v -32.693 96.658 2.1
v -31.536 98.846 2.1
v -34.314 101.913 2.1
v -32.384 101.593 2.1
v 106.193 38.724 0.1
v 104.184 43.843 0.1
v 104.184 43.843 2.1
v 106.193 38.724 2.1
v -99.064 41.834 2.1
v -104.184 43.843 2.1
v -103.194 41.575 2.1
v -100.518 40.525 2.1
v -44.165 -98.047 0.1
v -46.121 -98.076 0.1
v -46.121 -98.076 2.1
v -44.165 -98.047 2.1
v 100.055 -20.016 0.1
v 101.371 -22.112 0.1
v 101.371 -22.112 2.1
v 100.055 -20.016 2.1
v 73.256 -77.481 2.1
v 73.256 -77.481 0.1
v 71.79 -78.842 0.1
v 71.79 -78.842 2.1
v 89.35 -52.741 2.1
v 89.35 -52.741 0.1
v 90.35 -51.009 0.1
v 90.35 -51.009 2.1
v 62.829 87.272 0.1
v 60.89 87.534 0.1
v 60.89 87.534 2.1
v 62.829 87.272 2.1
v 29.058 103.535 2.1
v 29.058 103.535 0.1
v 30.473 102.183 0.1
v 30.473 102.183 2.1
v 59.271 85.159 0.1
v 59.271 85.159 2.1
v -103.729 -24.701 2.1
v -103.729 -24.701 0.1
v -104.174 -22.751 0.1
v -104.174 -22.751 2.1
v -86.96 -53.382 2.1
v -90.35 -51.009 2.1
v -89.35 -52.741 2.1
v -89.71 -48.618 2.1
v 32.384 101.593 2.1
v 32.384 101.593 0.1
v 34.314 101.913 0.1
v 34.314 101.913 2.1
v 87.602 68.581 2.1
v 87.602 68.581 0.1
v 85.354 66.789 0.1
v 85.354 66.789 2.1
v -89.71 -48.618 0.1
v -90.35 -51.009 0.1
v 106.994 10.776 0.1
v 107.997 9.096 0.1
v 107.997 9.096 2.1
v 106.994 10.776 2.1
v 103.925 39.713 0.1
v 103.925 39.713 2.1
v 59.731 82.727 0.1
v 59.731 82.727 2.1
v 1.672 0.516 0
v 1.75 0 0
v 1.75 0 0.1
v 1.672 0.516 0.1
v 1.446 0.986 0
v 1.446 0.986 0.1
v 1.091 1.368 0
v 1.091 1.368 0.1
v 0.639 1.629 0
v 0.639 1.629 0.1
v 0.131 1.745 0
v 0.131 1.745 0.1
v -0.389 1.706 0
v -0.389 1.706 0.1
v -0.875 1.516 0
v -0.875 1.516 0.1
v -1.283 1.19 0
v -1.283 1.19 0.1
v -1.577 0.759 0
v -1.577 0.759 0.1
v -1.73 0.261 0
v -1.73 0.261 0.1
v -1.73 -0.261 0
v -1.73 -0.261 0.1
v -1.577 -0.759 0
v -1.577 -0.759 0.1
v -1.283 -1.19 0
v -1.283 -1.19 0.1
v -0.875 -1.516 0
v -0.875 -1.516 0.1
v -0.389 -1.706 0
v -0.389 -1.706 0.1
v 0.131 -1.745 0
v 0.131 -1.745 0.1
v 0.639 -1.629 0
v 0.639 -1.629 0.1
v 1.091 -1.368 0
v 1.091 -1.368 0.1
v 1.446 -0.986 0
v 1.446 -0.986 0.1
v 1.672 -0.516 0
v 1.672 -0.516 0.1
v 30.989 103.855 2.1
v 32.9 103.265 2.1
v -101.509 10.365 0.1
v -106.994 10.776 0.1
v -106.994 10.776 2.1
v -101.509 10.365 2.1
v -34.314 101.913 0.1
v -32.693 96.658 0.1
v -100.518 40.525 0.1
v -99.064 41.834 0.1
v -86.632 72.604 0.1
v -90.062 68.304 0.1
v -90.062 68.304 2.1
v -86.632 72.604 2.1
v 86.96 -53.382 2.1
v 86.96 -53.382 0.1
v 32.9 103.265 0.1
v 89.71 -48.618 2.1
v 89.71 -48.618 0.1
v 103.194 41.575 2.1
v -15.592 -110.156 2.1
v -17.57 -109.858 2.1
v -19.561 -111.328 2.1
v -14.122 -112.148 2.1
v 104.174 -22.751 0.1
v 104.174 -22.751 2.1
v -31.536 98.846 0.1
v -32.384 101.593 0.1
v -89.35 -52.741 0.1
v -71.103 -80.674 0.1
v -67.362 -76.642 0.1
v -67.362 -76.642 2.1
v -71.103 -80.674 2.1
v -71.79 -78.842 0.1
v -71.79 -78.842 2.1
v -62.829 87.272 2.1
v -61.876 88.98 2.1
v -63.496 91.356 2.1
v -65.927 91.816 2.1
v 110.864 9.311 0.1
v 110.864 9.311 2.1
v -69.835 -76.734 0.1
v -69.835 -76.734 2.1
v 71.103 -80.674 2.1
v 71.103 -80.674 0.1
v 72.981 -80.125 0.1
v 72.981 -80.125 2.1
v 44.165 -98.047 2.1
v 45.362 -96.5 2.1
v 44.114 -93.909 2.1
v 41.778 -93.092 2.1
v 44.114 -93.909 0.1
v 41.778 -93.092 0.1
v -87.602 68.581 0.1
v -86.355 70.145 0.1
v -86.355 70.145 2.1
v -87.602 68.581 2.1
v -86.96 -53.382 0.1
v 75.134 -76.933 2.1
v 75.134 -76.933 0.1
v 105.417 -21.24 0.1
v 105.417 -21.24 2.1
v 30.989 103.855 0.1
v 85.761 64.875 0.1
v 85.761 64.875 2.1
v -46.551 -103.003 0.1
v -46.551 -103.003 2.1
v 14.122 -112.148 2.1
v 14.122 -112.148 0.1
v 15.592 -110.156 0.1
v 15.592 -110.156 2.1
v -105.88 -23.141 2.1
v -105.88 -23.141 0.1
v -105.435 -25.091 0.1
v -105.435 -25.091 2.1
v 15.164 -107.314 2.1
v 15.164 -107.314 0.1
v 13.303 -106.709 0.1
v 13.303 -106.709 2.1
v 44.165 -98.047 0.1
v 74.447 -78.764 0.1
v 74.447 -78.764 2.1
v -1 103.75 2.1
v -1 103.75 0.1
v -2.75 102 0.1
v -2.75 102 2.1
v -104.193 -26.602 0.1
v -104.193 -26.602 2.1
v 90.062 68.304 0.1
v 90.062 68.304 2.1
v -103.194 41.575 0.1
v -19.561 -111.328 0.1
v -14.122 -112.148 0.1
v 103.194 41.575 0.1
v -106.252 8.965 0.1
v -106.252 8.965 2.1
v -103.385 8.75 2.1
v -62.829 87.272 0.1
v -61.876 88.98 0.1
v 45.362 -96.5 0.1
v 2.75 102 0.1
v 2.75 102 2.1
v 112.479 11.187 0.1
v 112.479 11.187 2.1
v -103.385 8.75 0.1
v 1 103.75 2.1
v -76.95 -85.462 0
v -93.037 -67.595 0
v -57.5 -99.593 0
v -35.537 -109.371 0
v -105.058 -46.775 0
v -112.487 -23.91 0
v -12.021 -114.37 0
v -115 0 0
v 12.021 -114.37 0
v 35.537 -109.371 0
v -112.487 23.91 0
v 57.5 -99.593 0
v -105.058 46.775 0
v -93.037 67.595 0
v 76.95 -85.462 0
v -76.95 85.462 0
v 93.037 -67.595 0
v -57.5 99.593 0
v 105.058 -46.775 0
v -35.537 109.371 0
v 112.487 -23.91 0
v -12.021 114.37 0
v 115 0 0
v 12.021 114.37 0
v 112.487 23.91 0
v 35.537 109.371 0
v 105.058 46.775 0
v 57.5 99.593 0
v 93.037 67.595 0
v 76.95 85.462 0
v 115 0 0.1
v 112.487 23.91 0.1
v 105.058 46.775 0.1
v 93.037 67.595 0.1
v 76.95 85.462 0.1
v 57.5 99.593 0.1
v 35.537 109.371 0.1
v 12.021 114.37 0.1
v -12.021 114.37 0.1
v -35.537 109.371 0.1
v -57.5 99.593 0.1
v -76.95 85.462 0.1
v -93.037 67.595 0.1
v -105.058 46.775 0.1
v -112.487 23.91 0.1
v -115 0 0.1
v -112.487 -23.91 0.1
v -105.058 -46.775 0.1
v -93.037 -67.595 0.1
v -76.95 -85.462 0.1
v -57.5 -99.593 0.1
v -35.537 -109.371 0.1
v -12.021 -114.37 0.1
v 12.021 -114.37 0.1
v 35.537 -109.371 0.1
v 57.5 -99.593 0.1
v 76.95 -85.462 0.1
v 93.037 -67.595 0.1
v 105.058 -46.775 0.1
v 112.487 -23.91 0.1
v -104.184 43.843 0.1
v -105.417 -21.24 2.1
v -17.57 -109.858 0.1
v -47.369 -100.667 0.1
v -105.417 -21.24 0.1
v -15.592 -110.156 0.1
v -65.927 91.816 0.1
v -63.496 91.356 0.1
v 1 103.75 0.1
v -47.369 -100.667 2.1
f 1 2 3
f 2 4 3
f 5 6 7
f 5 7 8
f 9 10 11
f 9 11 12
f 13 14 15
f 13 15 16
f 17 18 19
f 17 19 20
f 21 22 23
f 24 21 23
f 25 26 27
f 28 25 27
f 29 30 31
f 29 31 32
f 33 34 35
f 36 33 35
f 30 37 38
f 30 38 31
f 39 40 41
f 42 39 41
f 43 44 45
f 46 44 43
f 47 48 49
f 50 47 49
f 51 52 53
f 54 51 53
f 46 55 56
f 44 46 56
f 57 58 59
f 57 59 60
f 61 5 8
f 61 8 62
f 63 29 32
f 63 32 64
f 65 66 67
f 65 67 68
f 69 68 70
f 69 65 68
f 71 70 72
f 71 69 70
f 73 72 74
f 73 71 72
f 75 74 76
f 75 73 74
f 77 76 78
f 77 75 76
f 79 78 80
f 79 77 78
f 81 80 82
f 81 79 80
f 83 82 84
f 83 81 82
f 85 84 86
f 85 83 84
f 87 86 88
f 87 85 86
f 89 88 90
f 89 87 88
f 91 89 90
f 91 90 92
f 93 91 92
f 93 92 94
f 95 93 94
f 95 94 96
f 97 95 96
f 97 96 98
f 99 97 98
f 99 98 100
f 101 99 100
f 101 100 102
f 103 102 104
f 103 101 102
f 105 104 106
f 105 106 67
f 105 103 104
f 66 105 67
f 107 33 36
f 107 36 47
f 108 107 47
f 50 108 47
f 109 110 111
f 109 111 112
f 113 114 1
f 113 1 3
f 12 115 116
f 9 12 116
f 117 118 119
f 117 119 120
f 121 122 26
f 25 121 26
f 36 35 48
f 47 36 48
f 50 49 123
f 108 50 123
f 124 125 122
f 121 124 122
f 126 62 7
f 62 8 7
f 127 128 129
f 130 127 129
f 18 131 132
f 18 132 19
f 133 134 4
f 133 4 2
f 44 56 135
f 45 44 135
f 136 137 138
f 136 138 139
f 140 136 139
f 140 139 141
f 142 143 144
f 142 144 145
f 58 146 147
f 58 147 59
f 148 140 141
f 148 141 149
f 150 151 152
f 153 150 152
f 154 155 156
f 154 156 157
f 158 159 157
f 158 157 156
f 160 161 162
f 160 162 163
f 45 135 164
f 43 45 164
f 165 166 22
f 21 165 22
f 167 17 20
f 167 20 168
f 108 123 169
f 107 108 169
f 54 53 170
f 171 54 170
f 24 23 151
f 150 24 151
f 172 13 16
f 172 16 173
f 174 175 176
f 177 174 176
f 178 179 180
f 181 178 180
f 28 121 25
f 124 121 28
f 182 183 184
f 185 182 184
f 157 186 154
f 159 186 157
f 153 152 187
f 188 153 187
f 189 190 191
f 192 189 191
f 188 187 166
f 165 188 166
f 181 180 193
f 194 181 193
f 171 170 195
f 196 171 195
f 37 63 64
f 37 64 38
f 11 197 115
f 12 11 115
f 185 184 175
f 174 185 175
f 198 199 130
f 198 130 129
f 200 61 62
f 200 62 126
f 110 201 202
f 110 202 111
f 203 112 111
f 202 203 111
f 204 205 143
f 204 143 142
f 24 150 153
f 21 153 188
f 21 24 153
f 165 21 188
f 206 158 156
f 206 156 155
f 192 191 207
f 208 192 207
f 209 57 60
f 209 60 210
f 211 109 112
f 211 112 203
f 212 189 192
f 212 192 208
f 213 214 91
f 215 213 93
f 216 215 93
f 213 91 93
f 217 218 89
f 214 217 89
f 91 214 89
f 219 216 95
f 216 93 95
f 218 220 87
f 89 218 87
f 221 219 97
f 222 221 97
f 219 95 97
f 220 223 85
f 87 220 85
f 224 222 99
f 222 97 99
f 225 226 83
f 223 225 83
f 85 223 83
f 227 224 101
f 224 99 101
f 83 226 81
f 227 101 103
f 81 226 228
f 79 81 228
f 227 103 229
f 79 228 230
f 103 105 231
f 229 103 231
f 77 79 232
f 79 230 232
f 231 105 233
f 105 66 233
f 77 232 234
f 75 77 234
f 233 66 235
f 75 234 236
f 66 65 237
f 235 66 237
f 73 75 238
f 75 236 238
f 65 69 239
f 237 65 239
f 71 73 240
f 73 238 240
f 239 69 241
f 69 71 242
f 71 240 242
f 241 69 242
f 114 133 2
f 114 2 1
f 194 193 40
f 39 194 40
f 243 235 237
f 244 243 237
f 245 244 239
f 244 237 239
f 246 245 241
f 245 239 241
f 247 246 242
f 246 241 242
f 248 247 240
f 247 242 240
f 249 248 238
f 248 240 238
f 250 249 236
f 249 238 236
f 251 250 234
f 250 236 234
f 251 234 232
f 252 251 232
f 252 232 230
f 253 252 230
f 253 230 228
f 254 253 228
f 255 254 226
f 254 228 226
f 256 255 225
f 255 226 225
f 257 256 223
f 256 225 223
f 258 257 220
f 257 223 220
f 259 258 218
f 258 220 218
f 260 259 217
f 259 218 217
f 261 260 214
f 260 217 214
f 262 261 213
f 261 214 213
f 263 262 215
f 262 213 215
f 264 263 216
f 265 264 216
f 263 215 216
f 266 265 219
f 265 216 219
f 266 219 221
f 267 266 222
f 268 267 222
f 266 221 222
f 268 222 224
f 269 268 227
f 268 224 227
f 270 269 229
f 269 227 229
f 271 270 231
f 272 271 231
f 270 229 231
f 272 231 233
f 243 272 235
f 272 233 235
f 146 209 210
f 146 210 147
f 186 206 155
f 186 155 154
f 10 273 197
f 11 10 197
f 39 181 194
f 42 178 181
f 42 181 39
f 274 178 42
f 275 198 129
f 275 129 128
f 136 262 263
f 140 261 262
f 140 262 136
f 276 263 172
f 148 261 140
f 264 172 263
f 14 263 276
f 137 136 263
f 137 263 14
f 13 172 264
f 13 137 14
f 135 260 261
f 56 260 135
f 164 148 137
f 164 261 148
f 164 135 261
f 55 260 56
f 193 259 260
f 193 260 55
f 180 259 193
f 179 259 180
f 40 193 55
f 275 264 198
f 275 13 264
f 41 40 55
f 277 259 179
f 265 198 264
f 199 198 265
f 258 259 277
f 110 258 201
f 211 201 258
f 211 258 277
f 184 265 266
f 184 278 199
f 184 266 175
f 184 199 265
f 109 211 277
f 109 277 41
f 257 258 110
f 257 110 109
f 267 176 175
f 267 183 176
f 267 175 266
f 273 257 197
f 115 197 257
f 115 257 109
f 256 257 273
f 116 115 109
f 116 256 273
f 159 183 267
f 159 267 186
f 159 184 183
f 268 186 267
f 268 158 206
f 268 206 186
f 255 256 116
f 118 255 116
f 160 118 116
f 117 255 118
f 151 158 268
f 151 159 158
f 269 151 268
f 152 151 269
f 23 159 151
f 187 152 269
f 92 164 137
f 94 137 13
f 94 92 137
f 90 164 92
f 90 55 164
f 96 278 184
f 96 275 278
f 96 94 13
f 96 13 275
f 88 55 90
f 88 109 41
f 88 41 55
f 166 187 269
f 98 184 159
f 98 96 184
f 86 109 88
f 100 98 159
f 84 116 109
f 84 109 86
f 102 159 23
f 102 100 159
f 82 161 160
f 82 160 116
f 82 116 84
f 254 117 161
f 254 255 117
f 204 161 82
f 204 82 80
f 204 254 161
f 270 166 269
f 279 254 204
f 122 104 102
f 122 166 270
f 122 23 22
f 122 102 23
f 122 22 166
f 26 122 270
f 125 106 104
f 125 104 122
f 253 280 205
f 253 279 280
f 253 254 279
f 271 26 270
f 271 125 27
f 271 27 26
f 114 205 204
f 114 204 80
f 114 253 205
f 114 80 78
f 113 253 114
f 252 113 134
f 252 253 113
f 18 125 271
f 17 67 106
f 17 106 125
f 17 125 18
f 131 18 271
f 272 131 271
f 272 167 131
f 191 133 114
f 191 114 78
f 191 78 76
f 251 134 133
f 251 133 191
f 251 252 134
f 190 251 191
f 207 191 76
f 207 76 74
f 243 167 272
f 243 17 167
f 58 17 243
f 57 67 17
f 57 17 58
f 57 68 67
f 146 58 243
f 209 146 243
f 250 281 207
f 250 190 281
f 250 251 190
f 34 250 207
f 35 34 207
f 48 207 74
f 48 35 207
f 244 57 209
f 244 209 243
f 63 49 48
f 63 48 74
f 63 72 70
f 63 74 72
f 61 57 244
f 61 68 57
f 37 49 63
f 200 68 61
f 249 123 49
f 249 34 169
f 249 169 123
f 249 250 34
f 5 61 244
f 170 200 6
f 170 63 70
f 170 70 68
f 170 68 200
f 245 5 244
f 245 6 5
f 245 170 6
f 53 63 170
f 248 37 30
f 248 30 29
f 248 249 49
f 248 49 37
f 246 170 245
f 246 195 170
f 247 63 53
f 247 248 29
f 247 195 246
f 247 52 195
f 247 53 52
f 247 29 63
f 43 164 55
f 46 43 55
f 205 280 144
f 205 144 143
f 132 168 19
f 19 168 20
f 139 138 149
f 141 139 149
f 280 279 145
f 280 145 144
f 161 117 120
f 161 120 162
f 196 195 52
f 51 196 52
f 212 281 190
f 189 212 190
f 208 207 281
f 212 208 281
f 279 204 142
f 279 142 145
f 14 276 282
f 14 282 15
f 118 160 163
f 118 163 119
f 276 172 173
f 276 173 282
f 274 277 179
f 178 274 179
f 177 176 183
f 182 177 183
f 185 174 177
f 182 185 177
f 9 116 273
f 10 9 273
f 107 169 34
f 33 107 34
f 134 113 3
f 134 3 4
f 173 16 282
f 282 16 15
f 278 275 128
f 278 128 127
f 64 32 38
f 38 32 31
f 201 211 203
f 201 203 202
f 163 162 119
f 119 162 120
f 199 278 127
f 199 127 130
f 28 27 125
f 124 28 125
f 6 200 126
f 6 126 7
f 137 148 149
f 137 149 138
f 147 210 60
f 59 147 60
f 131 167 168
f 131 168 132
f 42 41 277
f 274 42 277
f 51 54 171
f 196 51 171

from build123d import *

# Parameters (mm, degrees)
SKETCH1_R           = 115
SKETCH1_R_2         = 1.75
BOSS_EXTRUDE1_DEPTH = 0.1
BOSS_EXTRUDE2_DEPTH = 2


with BuildPart() as part:
    # Sketch1 → Boss-Extrude1 (new body)
    with BuildSketch(Plane.XY):
        Circle(SKETCH1_R)
        Circle(SKETCH1_R_2, mode=Mode.SUBTRACT)
    extrude(amount=BOSS_EXTRUDE1_DEPTH)

    # Sketch2 → Boss-Extrude2 (add)
    with BuildSketch(Plane.XY.offset(0.1)):
        Polygon((2.75, 102), (1, 103.75), (-1, 103.75), (-2.75, 102), align=None)
        Polygon((-31.536422151, 98.845923426), (-32.692853006, 96.657849461), (-34.314006465, 101.913499892), (-32.383843277, 101.593195243), align=None)
        Polygon((-61.876050067, 88.980307108), (-62.829062871, 87.271538079), (-65.927323191, 91.815851338), (-63.495595234, 91.355743585), align=None)
        Polygon((-86.355262623, 70.145071939), (-87.602242226, 68.581408974), (-90.061554474, 68.304311033), (-86.632360564, 72.604384187), align=None)
        Polygon((-104.18404578, 43.843438562), (-103.194363512, 41.575062709), (-100.518101485, 40.524707264), (-99.064240162, 41.834062928), align=None)
        Polygon((-106.252124781, 8.965300026), (-106.99390044, 10.775795503), (-101.509279555, 10.364779988), (-103.385163864, 8.750451007), align=None)
        Polygon((-105.416683128, -21.239948642), (-105.880333417, -23.140778305), (-105.435291549, -25.09063413), (-104.192817991, -26.602052159), (-103.729167702, -24.701222495), (-104.17420957, -22.751366671), align=None)
        Polygon((-86.959591186, -53.38156986), (-89.709591186, -48.61843014), (-90.350135643, -51.008974596), (-89.350135643, -52.741025404), align=None)
        Polygon((-69.834869672, -76.73430444), (-67.361726605, -76.641765956), (-71.102676663, -80.673551251), (-71.790366293, -78.841828572), align=None)
        Polygon((-46.121181359, -98.076384798), (-44.164837568, -98.047333582), (-46.551198134, -103.002662356), (-47.368597109, -100.666670293), align=None)
        Polygon((-17.569782938, -109.858387151), (-15.592121286, -110.156471684), (-14.122491306, -112.147749595), (-19.56106085, -111.328017131), align=None)
        Polygon((14.122491306, -112.147749595), (15.592121286, -110.156471684), (15.163624771, -107.313583058), (13.302758842, -106.709180051), align=None)
        Polygon((45.361884816, -96.499689279), (44.164837568, -98.047333582), (41.778477003, -93.092004809), (44.114469066, -93.909403784), align=None)
        Polygon((71.102676663, -80.673551251), (72.980668584, -80.124669347), (74.446772328, -78.764323872), (75.134461958, -76.932601193), (73.256470037, -77.481483096), (71.790366293, -78.841828572), align=None)
        Polygon((89.709591186, -48.61843014), (86.959591186, -53.38156986), (89.350135643, -52.741025404), (90.350135643, -51.008974596), align=None)
        Polygon((101.371291823, -22.111618986), (100.054579611, -20.016083505), (105.416683128, -21.239948642), (104.17420957, -22.751366671), align=None)
        Polygon((107.997231426, 9.09607769), (106.99390044, 10.775795503), (112.478521324, 11.186811018), (110.864192343, 9.310926709), align=None)
        Polygon((103.925045561, 39.713315212), (103.194363512, 41.575062709), (104.18404578, 43.843438562), (106.193421414, 38.723632945), align=None)
        Polygon((90.061554474, 68.304311033), (87.602242226, 68.581408974), (85.354476714, 66.788875794), (85.76148132, 64.875117123), align=None)
        Polygon((60.890239965, 87.534389253), (62.829062871, 87.271538079), (59.730802552, 82.727224821), (59.270694798, 85.158952777), align=None)
        Polygon((34.314006465, 101.913499892), (32.899664833, 103.265447653), (30.988519221, 103.854958001), (29.058356033, 103.534653352), (30.472697666, 102.182705591), (32.383843277, 101.593195243), align=None)
    extrude(amount=BOSS_EXTRUDE2_DEPTH)


solid = part.part
